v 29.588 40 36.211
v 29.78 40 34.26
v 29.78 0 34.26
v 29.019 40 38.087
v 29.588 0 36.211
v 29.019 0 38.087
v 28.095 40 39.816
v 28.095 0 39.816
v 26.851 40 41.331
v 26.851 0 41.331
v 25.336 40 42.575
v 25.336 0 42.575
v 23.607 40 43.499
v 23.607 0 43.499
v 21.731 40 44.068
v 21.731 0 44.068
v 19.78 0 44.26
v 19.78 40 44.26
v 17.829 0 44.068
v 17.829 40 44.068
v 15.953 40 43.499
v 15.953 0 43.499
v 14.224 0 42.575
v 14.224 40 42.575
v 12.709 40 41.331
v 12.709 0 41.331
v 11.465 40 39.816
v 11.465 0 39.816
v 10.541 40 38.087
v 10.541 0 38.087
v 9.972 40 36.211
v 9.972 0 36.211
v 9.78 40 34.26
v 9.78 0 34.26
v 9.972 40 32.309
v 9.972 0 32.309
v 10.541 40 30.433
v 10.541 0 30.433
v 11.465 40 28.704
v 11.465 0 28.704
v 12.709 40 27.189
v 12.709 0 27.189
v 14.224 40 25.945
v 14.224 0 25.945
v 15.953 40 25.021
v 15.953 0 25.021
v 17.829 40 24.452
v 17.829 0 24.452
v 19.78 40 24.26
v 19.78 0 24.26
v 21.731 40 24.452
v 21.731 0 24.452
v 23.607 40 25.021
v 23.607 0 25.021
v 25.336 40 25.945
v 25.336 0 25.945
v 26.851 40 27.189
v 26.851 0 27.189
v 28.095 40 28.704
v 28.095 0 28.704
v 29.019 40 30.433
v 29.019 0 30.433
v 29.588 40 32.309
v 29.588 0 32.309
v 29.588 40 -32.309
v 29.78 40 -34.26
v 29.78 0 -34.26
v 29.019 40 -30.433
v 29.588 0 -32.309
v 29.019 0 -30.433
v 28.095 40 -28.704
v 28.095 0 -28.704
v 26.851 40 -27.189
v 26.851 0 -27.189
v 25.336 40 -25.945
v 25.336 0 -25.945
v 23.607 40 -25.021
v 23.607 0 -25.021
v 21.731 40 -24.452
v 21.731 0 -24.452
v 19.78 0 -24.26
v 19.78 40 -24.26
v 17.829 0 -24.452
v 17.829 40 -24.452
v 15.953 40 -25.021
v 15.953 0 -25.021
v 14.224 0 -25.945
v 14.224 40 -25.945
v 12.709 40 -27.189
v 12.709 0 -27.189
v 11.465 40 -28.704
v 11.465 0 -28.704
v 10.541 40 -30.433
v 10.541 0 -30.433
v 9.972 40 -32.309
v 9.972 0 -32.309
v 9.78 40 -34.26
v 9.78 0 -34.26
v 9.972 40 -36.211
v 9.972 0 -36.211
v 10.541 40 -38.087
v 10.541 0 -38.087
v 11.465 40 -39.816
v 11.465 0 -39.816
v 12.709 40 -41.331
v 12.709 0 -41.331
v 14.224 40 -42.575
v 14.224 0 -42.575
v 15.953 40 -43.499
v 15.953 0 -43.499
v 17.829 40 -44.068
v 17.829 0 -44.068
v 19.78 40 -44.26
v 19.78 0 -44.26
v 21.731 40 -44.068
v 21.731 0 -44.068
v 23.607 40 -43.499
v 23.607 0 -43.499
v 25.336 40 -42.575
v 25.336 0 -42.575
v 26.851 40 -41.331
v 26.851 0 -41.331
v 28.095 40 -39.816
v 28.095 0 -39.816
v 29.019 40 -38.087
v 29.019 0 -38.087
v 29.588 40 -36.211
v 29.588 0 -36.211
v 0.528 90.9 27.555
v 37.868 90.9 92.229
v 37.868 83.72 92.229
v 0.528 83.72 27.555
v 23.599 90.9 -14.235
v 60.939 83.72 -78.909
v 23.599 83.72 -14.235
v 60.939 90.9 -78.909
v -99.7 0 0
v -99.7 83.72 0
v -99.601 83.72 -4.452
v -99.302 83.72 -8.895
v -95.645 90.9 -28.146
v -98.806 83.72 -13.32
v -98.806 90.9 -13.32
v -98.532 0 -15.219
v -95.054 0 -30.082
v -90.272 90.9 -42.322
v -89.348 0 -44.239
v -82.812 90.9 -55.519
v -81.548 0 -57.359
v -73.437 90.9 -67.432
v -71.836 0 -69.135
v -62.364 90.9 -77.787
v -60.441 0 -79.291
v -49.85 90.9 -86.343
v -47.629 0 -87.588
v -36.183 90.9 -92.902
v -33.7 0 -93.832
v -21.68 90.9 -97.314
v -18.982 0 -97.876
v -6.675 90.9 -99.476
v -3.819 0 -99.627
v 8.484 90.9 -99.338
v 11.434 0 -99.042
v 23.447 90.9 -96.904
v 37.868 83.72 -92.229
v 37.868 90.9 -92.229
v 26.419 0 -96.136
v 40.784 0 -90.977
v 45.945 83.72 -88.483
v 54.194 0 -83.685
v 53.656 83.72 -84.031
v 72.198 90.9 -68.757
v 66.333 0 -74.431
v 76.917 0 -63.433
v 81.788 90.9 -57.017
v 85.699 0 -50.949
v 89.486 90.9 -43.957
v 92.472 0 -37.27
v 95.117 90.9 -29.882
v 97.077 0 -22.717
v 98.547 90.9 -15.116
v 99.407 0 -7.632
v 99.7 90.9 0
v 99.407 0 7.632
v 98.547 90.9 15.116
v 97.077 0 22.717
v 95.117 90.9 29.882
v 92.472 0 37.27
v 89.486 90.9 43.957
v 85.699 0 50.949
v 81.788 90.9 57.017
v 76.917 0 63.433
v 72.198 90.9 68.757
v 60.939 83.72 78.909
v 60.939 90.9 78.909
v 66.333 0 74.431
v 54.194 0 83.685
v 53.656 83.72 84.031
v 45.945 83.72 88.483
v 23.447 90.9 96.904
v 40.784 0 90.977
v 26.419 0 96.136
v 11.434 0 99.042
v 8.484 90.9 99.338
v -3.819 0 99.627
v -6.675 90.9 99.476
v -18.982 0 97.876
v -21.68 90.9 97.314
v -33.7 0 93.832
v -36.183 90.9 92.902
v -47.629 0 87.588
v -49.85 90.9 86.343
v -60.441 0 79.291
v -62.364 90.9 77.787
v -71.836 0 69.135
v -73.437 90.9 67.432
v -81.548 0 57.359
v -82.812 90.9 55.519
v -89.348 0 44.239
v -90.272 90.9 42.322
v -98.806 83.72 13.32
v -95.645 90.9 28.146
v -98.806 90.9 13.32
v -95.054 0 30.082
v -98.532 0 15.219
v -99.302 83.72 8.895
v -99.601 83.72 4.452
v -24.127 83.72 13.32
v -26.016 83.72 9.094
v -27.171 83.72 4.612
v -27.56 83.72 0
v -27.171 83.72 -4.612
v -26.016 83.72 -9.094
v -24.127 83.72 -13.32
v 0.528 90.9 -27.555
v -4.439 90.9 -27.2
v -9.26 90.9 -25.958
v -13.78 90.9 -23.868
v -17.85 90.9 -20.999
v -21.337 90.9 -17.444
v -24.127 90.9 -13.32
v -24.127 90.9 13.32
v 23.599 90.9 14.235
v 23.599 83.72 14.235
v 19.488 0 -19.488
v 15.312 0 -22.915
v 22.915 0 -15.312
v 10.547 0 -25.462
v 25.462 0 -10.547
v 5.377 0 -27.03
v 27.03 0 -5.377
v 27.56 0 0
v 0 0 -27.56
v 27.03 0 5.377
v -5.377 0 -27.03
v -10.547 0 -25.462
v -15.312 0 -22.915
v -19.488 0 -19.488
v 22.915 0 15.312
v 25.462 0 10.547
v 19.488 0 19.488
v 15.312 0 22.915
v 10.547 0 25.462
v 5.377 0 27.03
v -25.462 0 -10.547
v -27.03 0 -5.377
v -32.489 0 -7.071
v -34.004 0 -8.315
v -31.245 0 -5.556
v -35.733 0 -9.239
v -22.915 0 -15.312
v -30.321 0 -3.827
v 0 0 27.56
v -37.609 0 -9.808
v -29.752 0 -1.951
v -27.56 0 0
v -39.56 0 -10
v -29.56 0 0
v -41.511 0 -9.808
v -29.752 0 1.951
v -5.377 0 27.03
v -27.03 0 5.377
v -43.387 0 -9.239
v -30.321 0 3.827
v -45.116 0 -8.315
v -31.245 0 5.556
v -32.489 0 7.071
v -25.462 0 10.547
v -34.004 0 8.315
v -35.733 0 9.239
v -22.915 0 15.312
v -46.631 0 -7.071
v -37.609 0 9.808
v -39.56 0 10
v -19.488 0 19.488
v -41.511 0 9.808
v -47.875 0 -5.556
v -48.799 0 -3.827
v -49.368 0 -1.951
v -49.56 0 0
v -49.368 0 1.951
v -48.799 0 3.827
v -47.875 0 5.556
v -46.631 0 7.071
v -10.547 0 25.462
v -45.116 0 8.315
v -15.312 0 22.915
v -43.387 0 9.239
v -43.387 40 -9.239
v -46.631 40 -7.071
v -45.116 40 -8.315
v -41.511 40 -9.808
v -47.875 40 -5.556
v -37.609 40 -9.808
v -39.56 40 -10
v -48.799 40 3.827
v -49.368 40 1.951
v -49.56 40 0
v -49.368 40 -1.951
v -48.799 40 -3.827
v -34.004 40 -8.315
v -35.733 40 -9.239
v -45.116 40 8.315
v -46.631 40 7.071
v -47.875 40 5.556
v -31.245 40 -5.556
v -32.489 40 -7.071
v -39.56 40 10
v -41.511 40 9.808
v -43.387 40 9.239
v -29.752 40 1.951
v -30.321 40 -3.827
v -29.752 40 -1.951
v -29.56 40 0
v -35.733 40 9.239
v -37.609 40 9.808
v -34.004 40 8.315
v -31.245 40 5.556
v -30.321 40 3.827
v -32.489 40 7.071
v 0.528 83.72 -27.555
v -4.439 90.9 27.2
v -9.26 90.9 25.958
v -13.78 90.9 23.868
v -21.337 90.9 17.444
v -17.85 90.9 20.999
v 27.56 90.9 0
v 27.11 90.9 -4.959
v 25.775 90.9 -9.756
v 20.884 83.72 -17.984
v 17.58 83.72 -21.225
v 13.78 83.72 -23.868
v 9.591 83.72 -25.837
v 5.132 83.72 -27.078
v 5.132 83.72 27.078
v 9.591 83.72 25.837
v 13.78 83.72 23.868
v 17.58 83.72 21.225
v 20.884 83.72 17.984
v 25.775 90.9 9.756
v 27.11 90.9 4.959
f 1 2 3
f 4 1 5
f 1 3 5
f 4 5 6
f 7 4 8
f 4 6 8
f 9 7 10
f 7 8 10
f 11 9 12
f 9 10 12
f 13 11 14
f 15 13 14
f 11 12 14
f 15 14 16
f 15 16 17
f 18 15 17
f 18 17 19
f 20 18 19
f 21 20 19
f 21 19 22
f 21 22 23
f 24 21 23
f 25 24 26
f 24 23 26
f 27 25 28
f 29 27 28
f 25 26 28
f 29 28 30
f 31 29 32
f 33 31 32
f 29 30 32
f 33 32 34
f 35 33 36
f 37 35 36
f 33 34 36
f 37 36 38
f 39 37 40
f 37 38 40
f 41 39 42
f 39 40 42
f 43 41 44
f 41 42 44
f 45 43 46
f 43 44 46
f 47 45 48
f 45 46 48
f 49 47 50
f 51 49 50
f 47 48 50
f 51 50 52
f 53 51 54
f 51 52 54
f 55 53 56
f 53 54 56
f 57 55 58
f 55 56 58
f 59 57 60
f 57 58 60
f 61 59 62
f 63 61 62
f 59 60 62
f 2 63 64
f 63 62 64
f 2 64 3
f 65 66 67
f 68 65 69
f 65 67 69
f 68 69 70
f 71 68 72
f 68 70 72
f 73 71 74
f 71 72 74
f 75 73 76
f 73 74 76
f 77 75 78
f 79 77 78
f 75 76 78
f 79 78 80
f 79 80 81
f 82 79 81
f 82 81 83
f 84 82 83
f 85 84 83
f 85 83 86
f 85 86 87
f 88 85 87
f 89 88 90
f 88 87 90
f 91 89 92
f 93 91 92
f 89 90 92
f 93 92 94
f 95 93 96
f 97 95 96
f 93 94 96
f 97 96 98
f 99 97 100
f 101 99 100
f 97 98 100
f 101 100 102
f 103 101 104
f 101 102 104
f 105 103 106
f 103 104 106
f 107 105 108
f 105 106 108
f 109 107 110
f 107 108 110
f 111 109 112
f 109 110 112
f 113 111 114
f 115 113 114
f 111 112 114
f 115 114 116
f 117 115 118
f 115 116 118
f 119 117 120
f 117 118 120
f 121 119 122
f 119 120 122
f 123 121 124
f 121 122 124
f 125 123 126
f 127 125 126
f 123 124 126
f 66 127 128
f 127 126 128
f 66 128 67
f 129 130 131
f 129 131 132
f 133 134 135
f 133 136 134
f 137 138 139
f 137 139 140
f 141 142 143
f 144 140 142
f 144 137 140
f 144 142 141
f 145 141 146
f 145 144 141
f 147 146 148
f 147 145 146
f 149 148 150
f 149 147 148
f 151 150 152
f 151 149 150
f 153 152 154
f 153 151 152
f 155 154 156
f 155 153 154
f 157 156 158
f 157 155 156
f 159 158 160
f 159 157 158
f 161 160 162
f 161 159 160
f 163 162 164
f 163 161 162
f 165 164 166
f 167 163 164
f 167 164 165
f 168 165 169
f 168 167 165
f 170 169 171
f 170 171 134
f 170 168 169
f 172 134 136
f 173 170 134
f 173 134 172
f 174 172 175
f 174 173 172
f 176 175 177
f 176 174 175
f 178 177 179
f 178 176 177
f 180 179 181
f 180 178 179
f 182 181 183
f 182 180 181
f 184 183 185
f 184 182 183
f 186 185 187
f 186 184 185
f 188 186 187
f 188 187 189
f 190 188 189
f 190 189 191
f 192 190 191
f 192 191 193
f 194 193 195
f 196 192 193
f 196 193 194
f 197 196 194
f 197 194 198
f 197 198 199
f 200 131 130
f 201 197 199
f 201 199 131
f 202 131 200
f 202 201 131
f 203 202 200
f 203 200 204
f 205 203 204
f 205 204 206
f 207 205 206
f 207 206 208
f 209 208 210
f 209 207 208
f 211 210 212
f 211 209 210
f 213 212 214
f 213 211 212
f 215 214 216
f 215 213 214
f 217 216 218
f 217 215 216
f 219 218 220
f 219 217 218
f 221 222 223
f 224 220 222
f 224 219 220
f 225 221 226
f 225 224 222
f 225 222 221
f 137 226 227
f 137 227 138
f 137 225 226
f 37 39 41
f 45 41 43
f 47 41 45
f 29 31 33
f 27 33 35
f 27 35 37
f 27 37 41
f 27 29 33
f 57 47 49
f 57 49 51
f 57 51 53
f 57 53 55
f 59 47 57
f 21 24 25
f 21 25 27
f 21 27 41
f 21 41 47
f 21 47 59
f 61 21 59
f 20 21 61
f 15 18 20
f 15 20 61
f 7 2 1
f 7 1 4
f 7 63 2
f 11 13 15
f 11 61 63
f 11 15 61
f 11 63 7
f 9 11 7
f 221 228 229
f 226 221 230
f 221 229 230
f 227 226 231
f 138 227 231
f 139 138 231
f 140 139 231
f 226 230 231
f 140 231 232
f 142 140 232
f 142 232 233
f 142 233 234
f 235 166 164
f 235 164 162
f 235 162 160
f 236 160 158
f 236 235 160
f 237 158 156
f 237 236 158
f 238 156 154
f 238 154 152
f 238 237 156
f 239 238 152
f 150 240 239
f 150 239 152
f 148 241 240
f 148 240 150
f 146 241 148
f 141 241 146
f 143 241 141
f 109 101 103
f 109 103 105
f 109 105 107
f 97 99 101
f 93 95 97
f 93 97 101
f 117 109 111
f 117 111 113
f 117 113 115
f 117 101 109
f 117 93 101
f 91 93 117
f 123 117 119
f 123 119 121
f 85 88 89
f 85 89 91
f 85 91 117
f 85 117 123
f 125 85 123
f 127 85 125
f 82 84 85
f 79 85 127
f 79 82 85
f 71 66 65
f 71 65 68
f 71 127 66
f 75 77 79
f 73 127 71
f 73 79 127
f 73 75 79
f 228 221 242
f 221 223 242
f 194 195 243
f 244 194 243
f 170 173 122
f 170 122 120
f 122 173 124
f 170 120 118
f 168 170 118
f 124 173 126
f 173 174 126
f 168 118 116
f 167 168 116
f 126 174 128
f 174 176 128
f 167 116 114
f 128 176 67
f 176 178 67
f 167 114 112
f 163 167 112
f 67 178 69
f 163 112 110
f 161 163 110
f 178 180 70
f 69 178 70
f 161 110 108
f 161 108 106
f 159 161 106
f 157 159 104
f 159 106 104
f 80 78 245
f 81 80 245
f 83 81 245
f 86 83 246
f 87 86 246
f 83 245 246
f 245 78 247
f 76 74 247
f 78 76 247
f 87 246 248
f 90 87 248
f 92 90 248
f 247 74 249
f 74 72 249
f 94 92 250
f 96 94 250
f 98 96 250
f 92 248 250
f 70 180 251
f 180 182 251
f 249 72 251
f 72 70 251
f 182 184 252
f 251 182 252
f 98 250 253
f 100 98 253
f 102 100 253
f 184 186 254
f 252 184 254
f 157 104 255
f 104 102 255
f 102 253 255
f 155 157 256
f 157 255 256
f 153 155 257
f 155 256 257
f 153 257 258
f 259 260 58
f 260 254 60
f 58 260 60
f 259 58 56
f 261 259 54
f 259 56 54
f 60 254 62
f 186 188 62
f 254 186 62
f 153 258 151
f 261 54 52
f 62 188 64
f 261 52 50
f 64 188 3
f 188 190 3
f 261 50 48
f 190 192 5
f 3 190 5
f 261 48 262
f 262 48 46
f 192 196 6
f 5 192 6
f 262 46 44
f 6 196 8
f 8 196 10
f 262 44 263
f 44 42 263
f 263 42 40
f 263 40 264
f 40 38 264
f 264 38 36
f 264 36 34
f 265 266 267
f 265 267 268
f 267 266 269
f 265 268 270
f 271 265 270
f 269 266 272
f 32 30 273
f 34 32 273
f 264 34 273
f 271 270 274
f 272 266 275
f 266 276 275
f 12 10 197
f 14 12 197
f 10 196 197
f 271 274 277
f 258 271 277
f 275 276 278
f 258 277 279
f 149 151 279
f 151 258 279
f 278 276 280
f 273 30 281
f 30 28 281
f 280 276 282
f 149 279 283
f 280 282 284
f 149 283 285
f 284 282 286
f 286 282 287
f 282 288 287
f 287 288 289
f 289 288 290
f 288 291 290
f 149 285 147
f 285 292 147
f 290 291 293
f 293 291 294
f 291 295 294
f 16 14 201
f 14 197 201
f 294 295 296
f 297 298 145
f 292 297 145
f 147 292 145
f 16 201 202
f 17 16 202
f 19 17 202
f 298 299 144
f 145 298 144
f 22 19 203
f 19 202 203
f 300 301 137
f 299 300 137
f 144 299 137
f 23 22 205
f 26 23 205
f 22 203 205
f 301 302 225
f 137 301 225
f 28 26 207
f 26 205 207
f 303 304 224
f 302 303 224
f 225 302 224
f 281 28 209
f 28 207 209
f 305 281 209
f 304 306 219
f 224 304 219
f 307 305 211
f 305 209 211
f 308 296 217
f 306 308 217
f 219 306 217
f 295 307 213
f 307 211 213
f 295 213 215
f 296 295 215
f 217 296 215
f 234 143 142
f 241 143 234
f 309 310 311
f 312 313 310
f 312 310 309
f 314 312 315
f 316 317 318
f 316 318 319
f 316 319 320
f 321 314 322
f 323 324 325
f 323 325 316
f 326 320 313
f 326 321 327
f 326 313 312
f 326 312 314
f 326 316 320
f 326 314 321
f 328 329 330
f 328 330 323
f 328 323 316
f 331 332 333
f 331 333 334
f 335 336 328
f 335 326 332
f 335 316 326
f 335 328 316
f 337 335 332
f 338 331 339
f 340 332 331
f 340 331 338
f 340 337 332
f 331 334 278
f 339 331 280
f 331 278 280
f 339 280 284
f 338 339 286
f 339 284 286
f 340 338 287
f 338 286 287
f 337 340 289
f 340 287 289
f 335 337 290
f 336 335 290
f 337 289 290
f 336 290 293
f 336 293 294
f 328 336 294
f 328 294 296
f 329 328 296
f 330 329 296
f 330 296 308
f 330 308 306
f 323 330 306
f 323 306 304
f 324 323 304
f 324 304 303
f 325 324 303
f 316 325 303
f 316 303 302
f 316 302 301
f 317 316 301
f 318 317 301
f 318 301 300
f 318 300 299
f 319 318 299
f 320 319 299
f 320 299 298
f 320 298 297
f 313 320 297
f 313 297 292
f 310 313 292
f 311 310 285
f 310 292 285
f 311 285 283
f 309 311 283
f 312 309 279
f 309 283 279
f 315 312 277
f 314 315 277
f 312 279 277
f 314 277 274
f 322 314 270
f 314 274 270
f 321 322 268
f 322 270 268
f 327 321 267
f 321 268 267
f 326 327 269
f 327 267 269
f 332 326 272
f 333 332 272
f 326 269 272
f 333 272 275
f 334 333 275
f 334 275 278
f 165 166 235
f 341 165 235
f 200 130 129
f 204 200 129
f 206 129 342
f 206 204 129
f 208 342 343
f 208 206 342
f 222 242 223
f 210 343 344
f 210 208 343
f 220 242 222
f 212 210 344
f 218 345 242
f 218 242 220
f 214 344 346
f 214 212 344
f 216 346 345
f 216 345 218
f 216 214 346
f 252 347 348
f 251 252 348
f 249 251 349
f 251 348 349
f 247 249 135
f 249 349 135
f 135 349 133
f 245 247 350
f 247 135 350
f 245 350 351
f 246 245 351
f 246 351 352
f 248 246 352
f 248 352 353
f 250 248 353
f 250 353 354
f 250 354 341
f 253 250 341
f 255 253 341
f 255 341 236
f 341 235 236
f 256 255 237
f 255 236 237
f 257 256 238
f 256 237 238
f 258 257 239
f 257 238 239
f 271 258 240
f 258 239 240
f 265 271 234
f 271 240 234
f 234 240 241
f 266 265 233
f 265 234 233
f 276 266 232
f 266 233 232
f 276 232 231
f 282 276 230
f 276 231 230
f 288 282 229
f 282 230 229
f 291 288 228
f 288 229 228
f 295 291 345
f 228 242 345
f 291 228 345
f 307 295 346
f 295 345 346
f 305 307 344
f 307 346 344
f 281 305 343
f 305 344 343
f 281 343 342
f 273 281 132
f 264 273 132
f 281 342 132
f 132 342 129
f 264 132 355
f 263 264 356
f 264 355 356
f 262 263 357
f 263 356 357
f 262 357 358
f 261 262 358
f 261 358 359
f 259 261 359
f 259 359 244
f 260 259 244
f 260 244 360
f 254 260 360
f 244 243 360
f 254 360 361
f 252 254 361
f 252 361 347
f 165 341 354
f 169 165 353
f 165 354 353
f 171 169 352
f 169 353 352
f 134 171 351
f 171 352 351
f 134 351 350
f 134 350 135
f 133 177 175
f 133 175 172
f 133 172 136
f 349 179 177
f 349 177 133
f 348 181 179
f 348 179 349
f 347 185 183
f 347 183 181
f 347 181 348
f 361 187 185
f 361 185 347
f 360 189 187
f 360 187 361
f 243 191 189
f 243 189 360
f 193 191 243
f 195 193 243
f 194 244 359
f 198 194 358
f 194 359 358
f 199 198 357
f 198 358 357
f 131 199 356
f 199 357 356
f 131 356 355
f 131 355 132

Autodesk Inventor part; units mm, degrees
ref_plane "XZ Plane" through (0, 0, 0) normal (0, 1, 0) x (-1, 0, 0)
sketch "Sketch1" plane through (0, 0, 0) normal (0, 1, 0) x (-1, 0, 0)
  circle A0 centre (0, 0) radius 99.7
extrude "Extrusion1" add sketch "Sketch1" along normal blind 90.9
sketch "Sketch2" plane through (0, 90.9, 0) normal (0, 1, 0) x (1, 0, 0)
  circle A0 centre (0, 0) radius 27.56
  dimension "d3" = 55.12
extrude "Extrusion2" cut sketch "Sketch2" against normal blind 90.9
sketch "Sketch3" plane through (0, 90.9, 0) normal (0, 1, 0) x (1, 0, 0)
  circle A0 centre (0, 0) radius 99.7 projected
  line L0 (-99.7, 0) -> (-98.8062, 13.32)
  line L1 (-98.8062, 13.32) -> (-24.1274, 13.32)
  circle A1 centre (0, 0) radius 27.56 projected
  line L2 (-99.7, 0) -> (-98.8062, -13.32)
  line L3 (-98.8062, -13.32) -> (-24.1274, -13.32)
  line L4 (37.8676, -92.2287) -> (0.5282, -27.5549)
  line L5 (49.85, -86.3427) -> (37.8676, -92.2287)
  line L6 (49.85, -86.3427) -> (60.9386, -78.9087)
  line L7 (60.9386, -78.9087) -> (23.5992, -14.2349)
  line L8 (60.9386, 78.9087) -> (23.5992, 14.2349)
  line L9 (49.85, 86.3427) -> (60.9386, 78.9087)
  line L10 (49.85, 86.3427) -> (37.8676, 92.2287)
  line L11 (37.8676, 92.2287) -> (0.5282, 27.5549)
  line L12 (-24.1274, 13.32) -> (-24.1274, -13.32)
  line L13 (0.5282, 27.5549) -> (23.5992, 14.2349)
  line L14 (23.5992, -14.2349) -> (0.5282, -27.5549)
  dimension "d6" = 13.35
  dimension "d15" = 360
ref_plane "Work Plane2" through (-99.7, 83.72, 0) normal (0.9978, 0, 0.067) x (0.067, 0, -0.9978)
sketch "Sketch4" plane through (-99.7, 83.72, 0) normal (0.9978, 0, 0.067) x (0.067, 0, -0.9978)
  line L0 (13.35, 0) -> (13.35, 7.18)
  line L1 (-13.2303, 7.18) -> (-13.2303, 0)
  point P0 (6.675, -83.72)
ref_plane "Work Plane1" through (-98.8062, 83.72, 13.32) normal (0.9978, 0, -0.067) x (-0.067, 0, -0.9978)
sketch "Sketch5" plane through (-98.8062, 83.72, 13.32) normal (0.9978, 0, -0.067) x (-0.067, 0, -0.9978)
  line L0 (13.35, 0) -> (13.35, 7.18) projected
  line L1 (0, 0) -> (13.35, 0) projected
  line L2 (13.35, 5.7337) -> (13.35, 0)
  line L3 (13.35, 0) -> (0, 0)
  line L4 (0, 0) -> (0, 7.18)
  line L5 (0, 7.18) -> (0, 0) projected
  line L6 (106.375, 7.18) -> (-93.025, 7.18) projected
  point P0 (6.675, -83.72)
  point P1 (26.5803, 7.18)
extrude "Extrusion4" cut sketch "Sketch5" against normal blind 7.18
ref_plane "Work Plane3" through (-99.7, 83.72, 0) normal (0.9978, 0, 0.067) x (0.067, 0, -0.9978)
sketch "Sketch6" plane through (-99.7, 83.72, 0) normal (0.9978, 0, 0.067) x (0.067, 0, -0.9978)
  line L0 (0, 0) -> (13.35, 0) projected
  line L1 (0, 0) -> (0, 7.18) projected
  line L2 (0, 0) -> (0, 7.18)
  line L3 (13.35, 7.18) -> (18.3498, 7.18) projected
  line L4 (0, 7.18) -> (13.35, 7.18)
  line L5 (13.35, 0) -> (13.35, 7.18) projected
  line L6 (13.35, 7.18) -> (13.35, 0)
  line L7 (13.35, 0) -> (0, 0)
  point P0 (6.675, -83.72)
extrude "Extrusion5" cut sketch "Sketch6" against normal blind 7.18
extrude "Extrusion6" cut sketch "Sketch3" against normal blind 7.18 contours L8 A1 L11 L10 L9 | L6 L5 L4 A1 L7 | L13 A1 | A1 L14 | L1 A1 L3 L2 L0
sketch "Sketch7" plane through (49.85, 83.72, -86.3427) normal (-0.5569, 0, 0.8306) x (0.8306, 0, 0.5569)
  line L0 (13.35, 7.18) -> (0, 7.18) projected
  line L1 (13.35, 0) -> (13.35, 7.18) projected
  line L2 (0, 7.18) -> (13.35, 7.18)
  line L3 (13.35, 0) -> (18.3498, 0) projected
  line L4 (13.35, 7.18) -> (13.35, 0)
  line L5 (0, 7.18) -> (0, 0) projected
  line L6 (13.35, 0) -> (0, 0)
  line L7 (0, 0) -> (0, 6.2119)
  line L8 (0, 7.18) -> (-13.2303, 7.18) projected
  line L9 (-13.2303, 4.6736) -> (0, 7.18)
  line L10 (0, 7.18) -> (0, 0)
  line L11 (-13.2303, -2.9965) -> (-13.2303, 4.6736)
  line L12 (-13.2303, 0) -> (-13.2303, 7.18) projected
  point P0 (6.675, -83.72)
extrude "Extrusion7" cut sketch "Sketch7" against normal blind 10 contours L1 L6 L5 L0
sketch "Sketch8" plane through (37.8676, 83.72, -92.2287) normal (-0.4409, 0, 0.8976) x (0.8976, 0, 0.4409)
  line L0 (0, 0) -> (0, 7.18) projected
  line L1 (-4.9998, 0) -> (0, 0) projected
  line L2 (0, 7.18) -> (0, 0)
  line L3 (0, 0) -> (13.35, 0) projected
  line L4 (0, 0) -> (13.35, 0)
  line L5 (13.35, 7.18) -> (13.35, 0) projected
  line L6 (13.35, 0) -> (13.35, 7.18)
  line L7 (0, 7.18) -> (13.35, 7.18) projected
  line L8 (13.35, 7.18) -> (0, 7.18)
  line L9 (0, 7.18) -> (0, 4.7035)
  point P0 (6.675, -83.72)
extrude "Extrusion8" cut sketch "Sketch8" against normal blind 10
sketch "Sketch10" plane through (49.85, 83.72, 86.3427) normal (-0.4409, 0, -0.8976) x (-0.8976, 0, 0.4409)
  line L0 (0, 7.18) -> (13.35, 7.18) projected
  line L1 (13.35, 7.18) -> (18.3498, 7.18) projected
  line L2 (0, 7.18) -> (13.35, 7.18)
  line L3 (13.35, 0) -> (18.3498, 0) projected
  line L4 (13.35, 7.18) -> (13.35, 0)
  line L5 (0, 0) -> (13.35, 0) projected
  line L6 (13.35, 0) -> (0, 0)
  line L7 (0, 0) -> (0, 7.18)
  line L8 (0, 7.18) -> (0, 0) projected
  point P0 (6.675, -83.72)
extrude "Extrusion9" cut sketch "Sketch10" against normal blind 10
sketch "Sketch11" plane through (60.9386, 83.72, 78.9087) normal (-0.5569, 0, -0.8306) x (-0.8306, 0, 0.5569)
  line L0 (-4.9998, 7.18) -> (0, 7.18) projected
  line L1 (13.35, 7.18) -> (0, 7.18) projected
  line L2 (0, 7.18) -> (13.35, 7.18)
  line L3 (0, 0) -> (13.35, 0) projected
  line L4 (13.35, 7.18) -> (13.35, 0)
  line L5 (13.35, 0) -> (0, 0)
  line L6 (0, 0) -> (0, 7.18) projected
  line L7 (0, 0) -> (0, 7.18)
  point P0 (6.675, -83.72)
extrude "Extrusion10" cut sketch "Sketch11" against normal blind 10
sketch "Sketch12" plane through (0, 90.9, 0) normal (0, 1, 0) x (1, 0, 0)
  arc A0 (37.8676, -92.2287) -> (60.9386, -78.9087) centre (0, 0) ccw projected
  arc A1 (-98.8062, -13.32) -> (37.8676, -92.2287) centre (0, 0) ccw projected
  arc A2 (-98.8062, 13.32) -> (-98.8062, -13.32) centre (0, 0) ccw projected
  arc A3 (37.8676, 92.2287) -> (-98.8062, 13.32) centre (0, 0) ccw projected
  arc A4 (60.9386, 78.9087) -> (37.8676, 92.2287) centre (0, 0) ccw projected
  arc A5 (60.9386, -78.9087) -> (60.9386, 78.9087) centre (0, 0) ccw projected
  circle A6 centre (0, 0) radius 99.7 projected
ref_plane "Work Plane5" through (-99.7, 0, 0) normal (1, 0, 0) x (0, 1, 0)
ref_plane "Work Plane6" through (0, 0, -99.7) normal (0, 0, 1) x (1, 0, 0)
sketch "Sketch13" plane through (0, 83.72, 0) normal (0, 1, 0) x (1, 0, 0)
  arc A0 (60.9386, 78.9087) -> (37.8676, 92.2287) centre (0, 0) ccw projected
sketch "Sketch14" plane through (-99.7, 83.72, 0) normal (0.9978, 0, 0.067) x (0.067, 0, -0.9978)
  point P0 (6.675, -83.72)
sketch "Sketch15" plane through (0, 0, 0) normal (0, -1, 0) x (1, 0, 0)
  circle A0 centre (0, 0) radius 27.56 projected
  circle A1 centre (19.78, 34.26) radius 10
  circle A2 centre (-39.56, 0) radius 10
  circle A3 centre (19.78, -34.26) radius 10
  point P0 (0.5282, 27.5549)
  point P1 (23.5992, 14.2349)
  dimension "d32" = 360
extrude "Extrusion11" cut sketch "Sketch15" against normal blind 40 contours A1 | A2 | A3
properties part number "3 jaww"
